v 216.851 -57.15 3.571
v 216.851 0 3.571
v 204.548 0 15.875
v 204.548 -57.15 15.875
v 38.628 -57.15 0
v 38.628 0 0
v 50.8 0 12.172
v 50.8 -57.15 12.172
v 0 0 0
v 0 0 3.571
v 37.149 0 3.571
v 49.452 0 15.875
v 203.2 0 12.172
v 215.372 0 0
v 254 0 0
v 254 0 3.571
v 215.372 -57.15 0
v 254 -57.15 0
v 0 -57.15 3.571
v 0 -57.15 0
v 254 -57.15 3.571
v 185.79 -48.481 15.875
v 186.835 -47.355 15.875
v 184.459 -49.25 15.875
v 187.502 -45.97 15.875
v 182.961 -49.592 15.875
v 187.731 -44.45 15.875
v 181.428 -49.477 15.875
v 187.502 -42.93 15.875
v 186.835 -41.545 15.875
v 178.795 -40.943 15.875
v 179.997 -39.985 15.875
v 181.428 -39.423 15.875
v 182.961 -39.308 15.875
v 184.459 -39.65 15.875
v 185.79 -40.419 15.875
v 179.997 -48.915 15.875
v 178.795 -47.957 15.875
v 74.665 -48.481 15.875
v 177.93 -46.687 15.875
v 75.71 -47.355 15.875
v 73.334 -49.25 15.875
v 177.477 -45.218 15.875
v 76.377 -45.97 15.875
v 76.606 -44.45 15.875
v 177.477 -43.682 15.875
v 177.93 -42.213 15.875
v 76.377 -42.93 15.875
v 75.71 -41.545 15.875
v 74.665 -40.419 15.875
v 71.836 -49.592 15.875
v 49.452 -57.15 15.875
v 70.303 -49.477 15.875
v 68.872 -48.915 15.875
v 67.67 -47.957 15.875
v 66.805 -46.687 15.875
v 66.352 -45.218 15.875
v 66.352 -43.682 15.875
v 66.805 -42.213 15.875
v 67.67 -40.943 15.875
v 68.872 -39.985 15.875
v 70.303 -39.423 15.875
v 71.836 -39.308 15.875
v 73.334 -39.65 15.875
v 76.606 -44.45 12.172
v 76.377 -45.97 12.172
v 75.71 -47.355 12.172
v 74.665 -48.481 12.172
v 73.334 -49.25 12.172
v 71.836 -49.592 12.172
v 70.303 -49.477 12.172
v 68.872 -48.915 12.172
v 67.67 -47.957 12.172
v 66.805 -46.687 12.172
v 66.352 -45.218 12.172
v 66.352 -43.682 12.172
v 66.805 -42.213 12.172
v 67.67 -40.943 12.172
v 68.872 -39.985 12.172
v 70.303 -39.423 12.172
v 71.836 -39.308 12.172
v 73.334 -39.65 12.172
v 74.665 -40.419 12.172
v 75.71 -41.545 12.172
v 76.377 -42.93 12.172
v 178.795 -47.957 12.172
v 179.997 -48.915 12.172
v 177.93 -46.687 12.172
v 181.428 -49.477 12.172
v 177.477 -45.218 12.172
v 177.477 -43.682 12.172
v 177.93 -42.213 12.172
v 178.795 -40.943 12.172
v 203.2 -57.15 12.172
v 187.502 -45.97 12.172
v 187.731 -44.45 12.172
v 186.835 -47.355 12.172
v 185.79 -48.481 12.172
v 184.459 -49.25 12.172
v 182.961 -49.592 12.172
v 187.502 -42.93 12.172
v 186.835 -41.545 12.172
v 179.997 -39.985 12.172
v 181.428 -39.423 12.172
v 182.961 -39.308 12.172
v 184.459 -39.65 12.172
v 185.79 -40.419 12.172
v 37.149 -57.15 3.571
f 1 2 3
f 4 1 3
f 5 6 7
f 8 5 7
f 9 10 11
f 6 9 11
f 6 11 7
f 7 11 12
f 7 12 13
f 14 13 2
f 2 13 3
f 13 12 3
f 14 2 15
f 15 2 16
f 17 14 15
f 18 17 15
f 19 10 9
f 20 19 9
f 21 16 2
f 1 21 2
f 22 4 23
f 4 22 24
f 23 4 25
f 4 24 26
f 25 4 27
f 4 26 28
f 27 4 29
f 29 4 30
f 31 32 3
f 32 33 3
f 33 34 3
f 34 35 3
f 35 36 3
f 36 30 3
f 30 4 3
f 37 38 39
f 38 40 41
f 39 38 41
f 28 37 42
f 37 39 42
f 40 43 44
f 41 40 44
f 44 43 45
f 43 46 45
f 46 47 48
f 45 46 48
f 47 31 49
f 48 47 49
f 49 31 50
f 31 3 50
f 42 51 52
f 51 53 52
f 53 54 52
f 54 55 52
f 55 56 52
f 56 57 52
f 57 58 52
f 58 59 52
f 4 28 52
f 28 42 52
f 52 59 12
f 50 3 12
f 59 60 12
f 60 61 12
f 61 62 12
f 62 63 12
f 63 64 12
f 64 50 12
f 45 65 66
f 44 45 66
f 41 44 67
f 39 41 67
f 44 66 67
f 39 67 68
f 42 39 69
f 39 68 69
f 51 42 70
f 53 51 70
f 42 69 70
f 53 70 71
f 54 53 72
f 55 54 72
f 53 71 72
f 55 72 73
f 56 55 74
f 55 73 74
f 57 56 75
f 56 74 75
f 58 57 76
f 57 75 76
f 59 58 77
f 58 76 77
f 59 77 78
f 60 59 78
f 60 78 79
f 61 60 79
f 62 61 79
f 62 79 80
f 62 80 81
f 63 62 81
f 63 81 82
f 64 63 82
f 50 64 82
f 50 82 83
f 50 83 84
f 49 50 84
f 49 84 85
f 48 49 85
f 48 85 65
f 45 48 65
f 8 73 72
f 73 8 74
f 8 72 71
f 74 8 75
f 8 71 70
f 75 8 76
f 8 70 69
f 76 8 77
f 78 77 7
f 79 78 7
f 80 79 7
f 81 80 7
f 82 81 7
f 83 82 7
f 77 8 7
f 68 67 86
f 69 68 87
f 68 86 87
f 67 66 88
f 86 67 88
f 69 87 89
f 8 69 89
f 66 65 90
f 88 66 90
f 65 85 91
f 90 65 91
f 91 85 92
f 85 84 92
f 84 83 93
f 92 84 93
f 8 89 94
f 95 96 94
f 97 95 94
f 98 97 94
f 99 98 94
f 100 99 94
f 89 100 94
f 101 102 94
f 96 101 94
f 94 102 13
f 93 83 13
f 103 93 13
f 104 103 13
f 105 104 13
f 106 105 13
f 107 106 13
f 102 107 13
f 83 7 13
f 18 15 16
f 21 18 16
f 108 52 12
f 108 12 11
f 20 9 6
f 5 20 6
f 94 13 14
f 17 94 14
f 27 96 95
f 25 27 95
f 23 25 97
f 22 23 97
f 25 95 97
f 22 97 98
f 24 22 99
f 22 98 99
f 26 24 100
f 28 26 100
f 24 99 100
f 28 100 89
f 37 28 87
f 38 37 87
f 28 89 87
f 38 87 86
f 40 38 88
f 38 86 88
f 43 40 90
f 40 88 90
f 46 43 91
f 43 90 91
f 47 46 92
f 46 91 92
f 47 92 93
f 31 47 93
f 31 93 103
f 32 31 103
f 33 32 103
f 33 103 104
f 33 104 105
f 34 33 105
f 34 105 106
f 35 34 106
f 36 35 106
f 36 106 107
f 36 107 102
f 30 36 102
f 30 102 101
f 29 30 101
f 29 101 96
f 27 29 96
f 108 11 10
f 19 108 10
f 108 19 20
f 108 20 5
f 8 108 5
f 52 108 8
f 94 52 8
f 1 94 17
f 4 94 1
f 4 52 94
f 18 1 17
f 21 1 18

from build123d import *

# Parameters (mm, degrees)
F1_DEPTH = 57.15
F2_R     = 5.1562
F3_DEPTH = 25.4


with BuildPart() as f1:
    # F0 (on Front) → F1 (new body)
    with BuildSketch(Plane.XZ):
        Polygon((0, 3.57124), (0, 0), (38.627791, 0), (50.8, 12.172209), (51.9684, 12.172209), (127, 12.172209), (203.2, 12.172209), (215.372209, 0), (254, 0), (254, 3.57124), (216.851466, 3.57124), (204.547706, 15.875), (49.452294, 15.875), (37.148534, 3.57124), align=None)
    extrude(amount=F1_DEPTH)

    # F2 (on face) → F3 (cut)
    with BuildSketch(Plane(origin=(0, 0, 0), x_dir=(1, 0, 0), z_dir=(0, 0, -1))):
        with Locations((71.4502, 44.45)):
            Circle(F2_R)
        with Locations((182.5752, 44.45)):
            Circle(F2_R)
    extrude(amount=-F3_DEPTH, mode=Mode.SUBTRACT)


solid = f1.part
